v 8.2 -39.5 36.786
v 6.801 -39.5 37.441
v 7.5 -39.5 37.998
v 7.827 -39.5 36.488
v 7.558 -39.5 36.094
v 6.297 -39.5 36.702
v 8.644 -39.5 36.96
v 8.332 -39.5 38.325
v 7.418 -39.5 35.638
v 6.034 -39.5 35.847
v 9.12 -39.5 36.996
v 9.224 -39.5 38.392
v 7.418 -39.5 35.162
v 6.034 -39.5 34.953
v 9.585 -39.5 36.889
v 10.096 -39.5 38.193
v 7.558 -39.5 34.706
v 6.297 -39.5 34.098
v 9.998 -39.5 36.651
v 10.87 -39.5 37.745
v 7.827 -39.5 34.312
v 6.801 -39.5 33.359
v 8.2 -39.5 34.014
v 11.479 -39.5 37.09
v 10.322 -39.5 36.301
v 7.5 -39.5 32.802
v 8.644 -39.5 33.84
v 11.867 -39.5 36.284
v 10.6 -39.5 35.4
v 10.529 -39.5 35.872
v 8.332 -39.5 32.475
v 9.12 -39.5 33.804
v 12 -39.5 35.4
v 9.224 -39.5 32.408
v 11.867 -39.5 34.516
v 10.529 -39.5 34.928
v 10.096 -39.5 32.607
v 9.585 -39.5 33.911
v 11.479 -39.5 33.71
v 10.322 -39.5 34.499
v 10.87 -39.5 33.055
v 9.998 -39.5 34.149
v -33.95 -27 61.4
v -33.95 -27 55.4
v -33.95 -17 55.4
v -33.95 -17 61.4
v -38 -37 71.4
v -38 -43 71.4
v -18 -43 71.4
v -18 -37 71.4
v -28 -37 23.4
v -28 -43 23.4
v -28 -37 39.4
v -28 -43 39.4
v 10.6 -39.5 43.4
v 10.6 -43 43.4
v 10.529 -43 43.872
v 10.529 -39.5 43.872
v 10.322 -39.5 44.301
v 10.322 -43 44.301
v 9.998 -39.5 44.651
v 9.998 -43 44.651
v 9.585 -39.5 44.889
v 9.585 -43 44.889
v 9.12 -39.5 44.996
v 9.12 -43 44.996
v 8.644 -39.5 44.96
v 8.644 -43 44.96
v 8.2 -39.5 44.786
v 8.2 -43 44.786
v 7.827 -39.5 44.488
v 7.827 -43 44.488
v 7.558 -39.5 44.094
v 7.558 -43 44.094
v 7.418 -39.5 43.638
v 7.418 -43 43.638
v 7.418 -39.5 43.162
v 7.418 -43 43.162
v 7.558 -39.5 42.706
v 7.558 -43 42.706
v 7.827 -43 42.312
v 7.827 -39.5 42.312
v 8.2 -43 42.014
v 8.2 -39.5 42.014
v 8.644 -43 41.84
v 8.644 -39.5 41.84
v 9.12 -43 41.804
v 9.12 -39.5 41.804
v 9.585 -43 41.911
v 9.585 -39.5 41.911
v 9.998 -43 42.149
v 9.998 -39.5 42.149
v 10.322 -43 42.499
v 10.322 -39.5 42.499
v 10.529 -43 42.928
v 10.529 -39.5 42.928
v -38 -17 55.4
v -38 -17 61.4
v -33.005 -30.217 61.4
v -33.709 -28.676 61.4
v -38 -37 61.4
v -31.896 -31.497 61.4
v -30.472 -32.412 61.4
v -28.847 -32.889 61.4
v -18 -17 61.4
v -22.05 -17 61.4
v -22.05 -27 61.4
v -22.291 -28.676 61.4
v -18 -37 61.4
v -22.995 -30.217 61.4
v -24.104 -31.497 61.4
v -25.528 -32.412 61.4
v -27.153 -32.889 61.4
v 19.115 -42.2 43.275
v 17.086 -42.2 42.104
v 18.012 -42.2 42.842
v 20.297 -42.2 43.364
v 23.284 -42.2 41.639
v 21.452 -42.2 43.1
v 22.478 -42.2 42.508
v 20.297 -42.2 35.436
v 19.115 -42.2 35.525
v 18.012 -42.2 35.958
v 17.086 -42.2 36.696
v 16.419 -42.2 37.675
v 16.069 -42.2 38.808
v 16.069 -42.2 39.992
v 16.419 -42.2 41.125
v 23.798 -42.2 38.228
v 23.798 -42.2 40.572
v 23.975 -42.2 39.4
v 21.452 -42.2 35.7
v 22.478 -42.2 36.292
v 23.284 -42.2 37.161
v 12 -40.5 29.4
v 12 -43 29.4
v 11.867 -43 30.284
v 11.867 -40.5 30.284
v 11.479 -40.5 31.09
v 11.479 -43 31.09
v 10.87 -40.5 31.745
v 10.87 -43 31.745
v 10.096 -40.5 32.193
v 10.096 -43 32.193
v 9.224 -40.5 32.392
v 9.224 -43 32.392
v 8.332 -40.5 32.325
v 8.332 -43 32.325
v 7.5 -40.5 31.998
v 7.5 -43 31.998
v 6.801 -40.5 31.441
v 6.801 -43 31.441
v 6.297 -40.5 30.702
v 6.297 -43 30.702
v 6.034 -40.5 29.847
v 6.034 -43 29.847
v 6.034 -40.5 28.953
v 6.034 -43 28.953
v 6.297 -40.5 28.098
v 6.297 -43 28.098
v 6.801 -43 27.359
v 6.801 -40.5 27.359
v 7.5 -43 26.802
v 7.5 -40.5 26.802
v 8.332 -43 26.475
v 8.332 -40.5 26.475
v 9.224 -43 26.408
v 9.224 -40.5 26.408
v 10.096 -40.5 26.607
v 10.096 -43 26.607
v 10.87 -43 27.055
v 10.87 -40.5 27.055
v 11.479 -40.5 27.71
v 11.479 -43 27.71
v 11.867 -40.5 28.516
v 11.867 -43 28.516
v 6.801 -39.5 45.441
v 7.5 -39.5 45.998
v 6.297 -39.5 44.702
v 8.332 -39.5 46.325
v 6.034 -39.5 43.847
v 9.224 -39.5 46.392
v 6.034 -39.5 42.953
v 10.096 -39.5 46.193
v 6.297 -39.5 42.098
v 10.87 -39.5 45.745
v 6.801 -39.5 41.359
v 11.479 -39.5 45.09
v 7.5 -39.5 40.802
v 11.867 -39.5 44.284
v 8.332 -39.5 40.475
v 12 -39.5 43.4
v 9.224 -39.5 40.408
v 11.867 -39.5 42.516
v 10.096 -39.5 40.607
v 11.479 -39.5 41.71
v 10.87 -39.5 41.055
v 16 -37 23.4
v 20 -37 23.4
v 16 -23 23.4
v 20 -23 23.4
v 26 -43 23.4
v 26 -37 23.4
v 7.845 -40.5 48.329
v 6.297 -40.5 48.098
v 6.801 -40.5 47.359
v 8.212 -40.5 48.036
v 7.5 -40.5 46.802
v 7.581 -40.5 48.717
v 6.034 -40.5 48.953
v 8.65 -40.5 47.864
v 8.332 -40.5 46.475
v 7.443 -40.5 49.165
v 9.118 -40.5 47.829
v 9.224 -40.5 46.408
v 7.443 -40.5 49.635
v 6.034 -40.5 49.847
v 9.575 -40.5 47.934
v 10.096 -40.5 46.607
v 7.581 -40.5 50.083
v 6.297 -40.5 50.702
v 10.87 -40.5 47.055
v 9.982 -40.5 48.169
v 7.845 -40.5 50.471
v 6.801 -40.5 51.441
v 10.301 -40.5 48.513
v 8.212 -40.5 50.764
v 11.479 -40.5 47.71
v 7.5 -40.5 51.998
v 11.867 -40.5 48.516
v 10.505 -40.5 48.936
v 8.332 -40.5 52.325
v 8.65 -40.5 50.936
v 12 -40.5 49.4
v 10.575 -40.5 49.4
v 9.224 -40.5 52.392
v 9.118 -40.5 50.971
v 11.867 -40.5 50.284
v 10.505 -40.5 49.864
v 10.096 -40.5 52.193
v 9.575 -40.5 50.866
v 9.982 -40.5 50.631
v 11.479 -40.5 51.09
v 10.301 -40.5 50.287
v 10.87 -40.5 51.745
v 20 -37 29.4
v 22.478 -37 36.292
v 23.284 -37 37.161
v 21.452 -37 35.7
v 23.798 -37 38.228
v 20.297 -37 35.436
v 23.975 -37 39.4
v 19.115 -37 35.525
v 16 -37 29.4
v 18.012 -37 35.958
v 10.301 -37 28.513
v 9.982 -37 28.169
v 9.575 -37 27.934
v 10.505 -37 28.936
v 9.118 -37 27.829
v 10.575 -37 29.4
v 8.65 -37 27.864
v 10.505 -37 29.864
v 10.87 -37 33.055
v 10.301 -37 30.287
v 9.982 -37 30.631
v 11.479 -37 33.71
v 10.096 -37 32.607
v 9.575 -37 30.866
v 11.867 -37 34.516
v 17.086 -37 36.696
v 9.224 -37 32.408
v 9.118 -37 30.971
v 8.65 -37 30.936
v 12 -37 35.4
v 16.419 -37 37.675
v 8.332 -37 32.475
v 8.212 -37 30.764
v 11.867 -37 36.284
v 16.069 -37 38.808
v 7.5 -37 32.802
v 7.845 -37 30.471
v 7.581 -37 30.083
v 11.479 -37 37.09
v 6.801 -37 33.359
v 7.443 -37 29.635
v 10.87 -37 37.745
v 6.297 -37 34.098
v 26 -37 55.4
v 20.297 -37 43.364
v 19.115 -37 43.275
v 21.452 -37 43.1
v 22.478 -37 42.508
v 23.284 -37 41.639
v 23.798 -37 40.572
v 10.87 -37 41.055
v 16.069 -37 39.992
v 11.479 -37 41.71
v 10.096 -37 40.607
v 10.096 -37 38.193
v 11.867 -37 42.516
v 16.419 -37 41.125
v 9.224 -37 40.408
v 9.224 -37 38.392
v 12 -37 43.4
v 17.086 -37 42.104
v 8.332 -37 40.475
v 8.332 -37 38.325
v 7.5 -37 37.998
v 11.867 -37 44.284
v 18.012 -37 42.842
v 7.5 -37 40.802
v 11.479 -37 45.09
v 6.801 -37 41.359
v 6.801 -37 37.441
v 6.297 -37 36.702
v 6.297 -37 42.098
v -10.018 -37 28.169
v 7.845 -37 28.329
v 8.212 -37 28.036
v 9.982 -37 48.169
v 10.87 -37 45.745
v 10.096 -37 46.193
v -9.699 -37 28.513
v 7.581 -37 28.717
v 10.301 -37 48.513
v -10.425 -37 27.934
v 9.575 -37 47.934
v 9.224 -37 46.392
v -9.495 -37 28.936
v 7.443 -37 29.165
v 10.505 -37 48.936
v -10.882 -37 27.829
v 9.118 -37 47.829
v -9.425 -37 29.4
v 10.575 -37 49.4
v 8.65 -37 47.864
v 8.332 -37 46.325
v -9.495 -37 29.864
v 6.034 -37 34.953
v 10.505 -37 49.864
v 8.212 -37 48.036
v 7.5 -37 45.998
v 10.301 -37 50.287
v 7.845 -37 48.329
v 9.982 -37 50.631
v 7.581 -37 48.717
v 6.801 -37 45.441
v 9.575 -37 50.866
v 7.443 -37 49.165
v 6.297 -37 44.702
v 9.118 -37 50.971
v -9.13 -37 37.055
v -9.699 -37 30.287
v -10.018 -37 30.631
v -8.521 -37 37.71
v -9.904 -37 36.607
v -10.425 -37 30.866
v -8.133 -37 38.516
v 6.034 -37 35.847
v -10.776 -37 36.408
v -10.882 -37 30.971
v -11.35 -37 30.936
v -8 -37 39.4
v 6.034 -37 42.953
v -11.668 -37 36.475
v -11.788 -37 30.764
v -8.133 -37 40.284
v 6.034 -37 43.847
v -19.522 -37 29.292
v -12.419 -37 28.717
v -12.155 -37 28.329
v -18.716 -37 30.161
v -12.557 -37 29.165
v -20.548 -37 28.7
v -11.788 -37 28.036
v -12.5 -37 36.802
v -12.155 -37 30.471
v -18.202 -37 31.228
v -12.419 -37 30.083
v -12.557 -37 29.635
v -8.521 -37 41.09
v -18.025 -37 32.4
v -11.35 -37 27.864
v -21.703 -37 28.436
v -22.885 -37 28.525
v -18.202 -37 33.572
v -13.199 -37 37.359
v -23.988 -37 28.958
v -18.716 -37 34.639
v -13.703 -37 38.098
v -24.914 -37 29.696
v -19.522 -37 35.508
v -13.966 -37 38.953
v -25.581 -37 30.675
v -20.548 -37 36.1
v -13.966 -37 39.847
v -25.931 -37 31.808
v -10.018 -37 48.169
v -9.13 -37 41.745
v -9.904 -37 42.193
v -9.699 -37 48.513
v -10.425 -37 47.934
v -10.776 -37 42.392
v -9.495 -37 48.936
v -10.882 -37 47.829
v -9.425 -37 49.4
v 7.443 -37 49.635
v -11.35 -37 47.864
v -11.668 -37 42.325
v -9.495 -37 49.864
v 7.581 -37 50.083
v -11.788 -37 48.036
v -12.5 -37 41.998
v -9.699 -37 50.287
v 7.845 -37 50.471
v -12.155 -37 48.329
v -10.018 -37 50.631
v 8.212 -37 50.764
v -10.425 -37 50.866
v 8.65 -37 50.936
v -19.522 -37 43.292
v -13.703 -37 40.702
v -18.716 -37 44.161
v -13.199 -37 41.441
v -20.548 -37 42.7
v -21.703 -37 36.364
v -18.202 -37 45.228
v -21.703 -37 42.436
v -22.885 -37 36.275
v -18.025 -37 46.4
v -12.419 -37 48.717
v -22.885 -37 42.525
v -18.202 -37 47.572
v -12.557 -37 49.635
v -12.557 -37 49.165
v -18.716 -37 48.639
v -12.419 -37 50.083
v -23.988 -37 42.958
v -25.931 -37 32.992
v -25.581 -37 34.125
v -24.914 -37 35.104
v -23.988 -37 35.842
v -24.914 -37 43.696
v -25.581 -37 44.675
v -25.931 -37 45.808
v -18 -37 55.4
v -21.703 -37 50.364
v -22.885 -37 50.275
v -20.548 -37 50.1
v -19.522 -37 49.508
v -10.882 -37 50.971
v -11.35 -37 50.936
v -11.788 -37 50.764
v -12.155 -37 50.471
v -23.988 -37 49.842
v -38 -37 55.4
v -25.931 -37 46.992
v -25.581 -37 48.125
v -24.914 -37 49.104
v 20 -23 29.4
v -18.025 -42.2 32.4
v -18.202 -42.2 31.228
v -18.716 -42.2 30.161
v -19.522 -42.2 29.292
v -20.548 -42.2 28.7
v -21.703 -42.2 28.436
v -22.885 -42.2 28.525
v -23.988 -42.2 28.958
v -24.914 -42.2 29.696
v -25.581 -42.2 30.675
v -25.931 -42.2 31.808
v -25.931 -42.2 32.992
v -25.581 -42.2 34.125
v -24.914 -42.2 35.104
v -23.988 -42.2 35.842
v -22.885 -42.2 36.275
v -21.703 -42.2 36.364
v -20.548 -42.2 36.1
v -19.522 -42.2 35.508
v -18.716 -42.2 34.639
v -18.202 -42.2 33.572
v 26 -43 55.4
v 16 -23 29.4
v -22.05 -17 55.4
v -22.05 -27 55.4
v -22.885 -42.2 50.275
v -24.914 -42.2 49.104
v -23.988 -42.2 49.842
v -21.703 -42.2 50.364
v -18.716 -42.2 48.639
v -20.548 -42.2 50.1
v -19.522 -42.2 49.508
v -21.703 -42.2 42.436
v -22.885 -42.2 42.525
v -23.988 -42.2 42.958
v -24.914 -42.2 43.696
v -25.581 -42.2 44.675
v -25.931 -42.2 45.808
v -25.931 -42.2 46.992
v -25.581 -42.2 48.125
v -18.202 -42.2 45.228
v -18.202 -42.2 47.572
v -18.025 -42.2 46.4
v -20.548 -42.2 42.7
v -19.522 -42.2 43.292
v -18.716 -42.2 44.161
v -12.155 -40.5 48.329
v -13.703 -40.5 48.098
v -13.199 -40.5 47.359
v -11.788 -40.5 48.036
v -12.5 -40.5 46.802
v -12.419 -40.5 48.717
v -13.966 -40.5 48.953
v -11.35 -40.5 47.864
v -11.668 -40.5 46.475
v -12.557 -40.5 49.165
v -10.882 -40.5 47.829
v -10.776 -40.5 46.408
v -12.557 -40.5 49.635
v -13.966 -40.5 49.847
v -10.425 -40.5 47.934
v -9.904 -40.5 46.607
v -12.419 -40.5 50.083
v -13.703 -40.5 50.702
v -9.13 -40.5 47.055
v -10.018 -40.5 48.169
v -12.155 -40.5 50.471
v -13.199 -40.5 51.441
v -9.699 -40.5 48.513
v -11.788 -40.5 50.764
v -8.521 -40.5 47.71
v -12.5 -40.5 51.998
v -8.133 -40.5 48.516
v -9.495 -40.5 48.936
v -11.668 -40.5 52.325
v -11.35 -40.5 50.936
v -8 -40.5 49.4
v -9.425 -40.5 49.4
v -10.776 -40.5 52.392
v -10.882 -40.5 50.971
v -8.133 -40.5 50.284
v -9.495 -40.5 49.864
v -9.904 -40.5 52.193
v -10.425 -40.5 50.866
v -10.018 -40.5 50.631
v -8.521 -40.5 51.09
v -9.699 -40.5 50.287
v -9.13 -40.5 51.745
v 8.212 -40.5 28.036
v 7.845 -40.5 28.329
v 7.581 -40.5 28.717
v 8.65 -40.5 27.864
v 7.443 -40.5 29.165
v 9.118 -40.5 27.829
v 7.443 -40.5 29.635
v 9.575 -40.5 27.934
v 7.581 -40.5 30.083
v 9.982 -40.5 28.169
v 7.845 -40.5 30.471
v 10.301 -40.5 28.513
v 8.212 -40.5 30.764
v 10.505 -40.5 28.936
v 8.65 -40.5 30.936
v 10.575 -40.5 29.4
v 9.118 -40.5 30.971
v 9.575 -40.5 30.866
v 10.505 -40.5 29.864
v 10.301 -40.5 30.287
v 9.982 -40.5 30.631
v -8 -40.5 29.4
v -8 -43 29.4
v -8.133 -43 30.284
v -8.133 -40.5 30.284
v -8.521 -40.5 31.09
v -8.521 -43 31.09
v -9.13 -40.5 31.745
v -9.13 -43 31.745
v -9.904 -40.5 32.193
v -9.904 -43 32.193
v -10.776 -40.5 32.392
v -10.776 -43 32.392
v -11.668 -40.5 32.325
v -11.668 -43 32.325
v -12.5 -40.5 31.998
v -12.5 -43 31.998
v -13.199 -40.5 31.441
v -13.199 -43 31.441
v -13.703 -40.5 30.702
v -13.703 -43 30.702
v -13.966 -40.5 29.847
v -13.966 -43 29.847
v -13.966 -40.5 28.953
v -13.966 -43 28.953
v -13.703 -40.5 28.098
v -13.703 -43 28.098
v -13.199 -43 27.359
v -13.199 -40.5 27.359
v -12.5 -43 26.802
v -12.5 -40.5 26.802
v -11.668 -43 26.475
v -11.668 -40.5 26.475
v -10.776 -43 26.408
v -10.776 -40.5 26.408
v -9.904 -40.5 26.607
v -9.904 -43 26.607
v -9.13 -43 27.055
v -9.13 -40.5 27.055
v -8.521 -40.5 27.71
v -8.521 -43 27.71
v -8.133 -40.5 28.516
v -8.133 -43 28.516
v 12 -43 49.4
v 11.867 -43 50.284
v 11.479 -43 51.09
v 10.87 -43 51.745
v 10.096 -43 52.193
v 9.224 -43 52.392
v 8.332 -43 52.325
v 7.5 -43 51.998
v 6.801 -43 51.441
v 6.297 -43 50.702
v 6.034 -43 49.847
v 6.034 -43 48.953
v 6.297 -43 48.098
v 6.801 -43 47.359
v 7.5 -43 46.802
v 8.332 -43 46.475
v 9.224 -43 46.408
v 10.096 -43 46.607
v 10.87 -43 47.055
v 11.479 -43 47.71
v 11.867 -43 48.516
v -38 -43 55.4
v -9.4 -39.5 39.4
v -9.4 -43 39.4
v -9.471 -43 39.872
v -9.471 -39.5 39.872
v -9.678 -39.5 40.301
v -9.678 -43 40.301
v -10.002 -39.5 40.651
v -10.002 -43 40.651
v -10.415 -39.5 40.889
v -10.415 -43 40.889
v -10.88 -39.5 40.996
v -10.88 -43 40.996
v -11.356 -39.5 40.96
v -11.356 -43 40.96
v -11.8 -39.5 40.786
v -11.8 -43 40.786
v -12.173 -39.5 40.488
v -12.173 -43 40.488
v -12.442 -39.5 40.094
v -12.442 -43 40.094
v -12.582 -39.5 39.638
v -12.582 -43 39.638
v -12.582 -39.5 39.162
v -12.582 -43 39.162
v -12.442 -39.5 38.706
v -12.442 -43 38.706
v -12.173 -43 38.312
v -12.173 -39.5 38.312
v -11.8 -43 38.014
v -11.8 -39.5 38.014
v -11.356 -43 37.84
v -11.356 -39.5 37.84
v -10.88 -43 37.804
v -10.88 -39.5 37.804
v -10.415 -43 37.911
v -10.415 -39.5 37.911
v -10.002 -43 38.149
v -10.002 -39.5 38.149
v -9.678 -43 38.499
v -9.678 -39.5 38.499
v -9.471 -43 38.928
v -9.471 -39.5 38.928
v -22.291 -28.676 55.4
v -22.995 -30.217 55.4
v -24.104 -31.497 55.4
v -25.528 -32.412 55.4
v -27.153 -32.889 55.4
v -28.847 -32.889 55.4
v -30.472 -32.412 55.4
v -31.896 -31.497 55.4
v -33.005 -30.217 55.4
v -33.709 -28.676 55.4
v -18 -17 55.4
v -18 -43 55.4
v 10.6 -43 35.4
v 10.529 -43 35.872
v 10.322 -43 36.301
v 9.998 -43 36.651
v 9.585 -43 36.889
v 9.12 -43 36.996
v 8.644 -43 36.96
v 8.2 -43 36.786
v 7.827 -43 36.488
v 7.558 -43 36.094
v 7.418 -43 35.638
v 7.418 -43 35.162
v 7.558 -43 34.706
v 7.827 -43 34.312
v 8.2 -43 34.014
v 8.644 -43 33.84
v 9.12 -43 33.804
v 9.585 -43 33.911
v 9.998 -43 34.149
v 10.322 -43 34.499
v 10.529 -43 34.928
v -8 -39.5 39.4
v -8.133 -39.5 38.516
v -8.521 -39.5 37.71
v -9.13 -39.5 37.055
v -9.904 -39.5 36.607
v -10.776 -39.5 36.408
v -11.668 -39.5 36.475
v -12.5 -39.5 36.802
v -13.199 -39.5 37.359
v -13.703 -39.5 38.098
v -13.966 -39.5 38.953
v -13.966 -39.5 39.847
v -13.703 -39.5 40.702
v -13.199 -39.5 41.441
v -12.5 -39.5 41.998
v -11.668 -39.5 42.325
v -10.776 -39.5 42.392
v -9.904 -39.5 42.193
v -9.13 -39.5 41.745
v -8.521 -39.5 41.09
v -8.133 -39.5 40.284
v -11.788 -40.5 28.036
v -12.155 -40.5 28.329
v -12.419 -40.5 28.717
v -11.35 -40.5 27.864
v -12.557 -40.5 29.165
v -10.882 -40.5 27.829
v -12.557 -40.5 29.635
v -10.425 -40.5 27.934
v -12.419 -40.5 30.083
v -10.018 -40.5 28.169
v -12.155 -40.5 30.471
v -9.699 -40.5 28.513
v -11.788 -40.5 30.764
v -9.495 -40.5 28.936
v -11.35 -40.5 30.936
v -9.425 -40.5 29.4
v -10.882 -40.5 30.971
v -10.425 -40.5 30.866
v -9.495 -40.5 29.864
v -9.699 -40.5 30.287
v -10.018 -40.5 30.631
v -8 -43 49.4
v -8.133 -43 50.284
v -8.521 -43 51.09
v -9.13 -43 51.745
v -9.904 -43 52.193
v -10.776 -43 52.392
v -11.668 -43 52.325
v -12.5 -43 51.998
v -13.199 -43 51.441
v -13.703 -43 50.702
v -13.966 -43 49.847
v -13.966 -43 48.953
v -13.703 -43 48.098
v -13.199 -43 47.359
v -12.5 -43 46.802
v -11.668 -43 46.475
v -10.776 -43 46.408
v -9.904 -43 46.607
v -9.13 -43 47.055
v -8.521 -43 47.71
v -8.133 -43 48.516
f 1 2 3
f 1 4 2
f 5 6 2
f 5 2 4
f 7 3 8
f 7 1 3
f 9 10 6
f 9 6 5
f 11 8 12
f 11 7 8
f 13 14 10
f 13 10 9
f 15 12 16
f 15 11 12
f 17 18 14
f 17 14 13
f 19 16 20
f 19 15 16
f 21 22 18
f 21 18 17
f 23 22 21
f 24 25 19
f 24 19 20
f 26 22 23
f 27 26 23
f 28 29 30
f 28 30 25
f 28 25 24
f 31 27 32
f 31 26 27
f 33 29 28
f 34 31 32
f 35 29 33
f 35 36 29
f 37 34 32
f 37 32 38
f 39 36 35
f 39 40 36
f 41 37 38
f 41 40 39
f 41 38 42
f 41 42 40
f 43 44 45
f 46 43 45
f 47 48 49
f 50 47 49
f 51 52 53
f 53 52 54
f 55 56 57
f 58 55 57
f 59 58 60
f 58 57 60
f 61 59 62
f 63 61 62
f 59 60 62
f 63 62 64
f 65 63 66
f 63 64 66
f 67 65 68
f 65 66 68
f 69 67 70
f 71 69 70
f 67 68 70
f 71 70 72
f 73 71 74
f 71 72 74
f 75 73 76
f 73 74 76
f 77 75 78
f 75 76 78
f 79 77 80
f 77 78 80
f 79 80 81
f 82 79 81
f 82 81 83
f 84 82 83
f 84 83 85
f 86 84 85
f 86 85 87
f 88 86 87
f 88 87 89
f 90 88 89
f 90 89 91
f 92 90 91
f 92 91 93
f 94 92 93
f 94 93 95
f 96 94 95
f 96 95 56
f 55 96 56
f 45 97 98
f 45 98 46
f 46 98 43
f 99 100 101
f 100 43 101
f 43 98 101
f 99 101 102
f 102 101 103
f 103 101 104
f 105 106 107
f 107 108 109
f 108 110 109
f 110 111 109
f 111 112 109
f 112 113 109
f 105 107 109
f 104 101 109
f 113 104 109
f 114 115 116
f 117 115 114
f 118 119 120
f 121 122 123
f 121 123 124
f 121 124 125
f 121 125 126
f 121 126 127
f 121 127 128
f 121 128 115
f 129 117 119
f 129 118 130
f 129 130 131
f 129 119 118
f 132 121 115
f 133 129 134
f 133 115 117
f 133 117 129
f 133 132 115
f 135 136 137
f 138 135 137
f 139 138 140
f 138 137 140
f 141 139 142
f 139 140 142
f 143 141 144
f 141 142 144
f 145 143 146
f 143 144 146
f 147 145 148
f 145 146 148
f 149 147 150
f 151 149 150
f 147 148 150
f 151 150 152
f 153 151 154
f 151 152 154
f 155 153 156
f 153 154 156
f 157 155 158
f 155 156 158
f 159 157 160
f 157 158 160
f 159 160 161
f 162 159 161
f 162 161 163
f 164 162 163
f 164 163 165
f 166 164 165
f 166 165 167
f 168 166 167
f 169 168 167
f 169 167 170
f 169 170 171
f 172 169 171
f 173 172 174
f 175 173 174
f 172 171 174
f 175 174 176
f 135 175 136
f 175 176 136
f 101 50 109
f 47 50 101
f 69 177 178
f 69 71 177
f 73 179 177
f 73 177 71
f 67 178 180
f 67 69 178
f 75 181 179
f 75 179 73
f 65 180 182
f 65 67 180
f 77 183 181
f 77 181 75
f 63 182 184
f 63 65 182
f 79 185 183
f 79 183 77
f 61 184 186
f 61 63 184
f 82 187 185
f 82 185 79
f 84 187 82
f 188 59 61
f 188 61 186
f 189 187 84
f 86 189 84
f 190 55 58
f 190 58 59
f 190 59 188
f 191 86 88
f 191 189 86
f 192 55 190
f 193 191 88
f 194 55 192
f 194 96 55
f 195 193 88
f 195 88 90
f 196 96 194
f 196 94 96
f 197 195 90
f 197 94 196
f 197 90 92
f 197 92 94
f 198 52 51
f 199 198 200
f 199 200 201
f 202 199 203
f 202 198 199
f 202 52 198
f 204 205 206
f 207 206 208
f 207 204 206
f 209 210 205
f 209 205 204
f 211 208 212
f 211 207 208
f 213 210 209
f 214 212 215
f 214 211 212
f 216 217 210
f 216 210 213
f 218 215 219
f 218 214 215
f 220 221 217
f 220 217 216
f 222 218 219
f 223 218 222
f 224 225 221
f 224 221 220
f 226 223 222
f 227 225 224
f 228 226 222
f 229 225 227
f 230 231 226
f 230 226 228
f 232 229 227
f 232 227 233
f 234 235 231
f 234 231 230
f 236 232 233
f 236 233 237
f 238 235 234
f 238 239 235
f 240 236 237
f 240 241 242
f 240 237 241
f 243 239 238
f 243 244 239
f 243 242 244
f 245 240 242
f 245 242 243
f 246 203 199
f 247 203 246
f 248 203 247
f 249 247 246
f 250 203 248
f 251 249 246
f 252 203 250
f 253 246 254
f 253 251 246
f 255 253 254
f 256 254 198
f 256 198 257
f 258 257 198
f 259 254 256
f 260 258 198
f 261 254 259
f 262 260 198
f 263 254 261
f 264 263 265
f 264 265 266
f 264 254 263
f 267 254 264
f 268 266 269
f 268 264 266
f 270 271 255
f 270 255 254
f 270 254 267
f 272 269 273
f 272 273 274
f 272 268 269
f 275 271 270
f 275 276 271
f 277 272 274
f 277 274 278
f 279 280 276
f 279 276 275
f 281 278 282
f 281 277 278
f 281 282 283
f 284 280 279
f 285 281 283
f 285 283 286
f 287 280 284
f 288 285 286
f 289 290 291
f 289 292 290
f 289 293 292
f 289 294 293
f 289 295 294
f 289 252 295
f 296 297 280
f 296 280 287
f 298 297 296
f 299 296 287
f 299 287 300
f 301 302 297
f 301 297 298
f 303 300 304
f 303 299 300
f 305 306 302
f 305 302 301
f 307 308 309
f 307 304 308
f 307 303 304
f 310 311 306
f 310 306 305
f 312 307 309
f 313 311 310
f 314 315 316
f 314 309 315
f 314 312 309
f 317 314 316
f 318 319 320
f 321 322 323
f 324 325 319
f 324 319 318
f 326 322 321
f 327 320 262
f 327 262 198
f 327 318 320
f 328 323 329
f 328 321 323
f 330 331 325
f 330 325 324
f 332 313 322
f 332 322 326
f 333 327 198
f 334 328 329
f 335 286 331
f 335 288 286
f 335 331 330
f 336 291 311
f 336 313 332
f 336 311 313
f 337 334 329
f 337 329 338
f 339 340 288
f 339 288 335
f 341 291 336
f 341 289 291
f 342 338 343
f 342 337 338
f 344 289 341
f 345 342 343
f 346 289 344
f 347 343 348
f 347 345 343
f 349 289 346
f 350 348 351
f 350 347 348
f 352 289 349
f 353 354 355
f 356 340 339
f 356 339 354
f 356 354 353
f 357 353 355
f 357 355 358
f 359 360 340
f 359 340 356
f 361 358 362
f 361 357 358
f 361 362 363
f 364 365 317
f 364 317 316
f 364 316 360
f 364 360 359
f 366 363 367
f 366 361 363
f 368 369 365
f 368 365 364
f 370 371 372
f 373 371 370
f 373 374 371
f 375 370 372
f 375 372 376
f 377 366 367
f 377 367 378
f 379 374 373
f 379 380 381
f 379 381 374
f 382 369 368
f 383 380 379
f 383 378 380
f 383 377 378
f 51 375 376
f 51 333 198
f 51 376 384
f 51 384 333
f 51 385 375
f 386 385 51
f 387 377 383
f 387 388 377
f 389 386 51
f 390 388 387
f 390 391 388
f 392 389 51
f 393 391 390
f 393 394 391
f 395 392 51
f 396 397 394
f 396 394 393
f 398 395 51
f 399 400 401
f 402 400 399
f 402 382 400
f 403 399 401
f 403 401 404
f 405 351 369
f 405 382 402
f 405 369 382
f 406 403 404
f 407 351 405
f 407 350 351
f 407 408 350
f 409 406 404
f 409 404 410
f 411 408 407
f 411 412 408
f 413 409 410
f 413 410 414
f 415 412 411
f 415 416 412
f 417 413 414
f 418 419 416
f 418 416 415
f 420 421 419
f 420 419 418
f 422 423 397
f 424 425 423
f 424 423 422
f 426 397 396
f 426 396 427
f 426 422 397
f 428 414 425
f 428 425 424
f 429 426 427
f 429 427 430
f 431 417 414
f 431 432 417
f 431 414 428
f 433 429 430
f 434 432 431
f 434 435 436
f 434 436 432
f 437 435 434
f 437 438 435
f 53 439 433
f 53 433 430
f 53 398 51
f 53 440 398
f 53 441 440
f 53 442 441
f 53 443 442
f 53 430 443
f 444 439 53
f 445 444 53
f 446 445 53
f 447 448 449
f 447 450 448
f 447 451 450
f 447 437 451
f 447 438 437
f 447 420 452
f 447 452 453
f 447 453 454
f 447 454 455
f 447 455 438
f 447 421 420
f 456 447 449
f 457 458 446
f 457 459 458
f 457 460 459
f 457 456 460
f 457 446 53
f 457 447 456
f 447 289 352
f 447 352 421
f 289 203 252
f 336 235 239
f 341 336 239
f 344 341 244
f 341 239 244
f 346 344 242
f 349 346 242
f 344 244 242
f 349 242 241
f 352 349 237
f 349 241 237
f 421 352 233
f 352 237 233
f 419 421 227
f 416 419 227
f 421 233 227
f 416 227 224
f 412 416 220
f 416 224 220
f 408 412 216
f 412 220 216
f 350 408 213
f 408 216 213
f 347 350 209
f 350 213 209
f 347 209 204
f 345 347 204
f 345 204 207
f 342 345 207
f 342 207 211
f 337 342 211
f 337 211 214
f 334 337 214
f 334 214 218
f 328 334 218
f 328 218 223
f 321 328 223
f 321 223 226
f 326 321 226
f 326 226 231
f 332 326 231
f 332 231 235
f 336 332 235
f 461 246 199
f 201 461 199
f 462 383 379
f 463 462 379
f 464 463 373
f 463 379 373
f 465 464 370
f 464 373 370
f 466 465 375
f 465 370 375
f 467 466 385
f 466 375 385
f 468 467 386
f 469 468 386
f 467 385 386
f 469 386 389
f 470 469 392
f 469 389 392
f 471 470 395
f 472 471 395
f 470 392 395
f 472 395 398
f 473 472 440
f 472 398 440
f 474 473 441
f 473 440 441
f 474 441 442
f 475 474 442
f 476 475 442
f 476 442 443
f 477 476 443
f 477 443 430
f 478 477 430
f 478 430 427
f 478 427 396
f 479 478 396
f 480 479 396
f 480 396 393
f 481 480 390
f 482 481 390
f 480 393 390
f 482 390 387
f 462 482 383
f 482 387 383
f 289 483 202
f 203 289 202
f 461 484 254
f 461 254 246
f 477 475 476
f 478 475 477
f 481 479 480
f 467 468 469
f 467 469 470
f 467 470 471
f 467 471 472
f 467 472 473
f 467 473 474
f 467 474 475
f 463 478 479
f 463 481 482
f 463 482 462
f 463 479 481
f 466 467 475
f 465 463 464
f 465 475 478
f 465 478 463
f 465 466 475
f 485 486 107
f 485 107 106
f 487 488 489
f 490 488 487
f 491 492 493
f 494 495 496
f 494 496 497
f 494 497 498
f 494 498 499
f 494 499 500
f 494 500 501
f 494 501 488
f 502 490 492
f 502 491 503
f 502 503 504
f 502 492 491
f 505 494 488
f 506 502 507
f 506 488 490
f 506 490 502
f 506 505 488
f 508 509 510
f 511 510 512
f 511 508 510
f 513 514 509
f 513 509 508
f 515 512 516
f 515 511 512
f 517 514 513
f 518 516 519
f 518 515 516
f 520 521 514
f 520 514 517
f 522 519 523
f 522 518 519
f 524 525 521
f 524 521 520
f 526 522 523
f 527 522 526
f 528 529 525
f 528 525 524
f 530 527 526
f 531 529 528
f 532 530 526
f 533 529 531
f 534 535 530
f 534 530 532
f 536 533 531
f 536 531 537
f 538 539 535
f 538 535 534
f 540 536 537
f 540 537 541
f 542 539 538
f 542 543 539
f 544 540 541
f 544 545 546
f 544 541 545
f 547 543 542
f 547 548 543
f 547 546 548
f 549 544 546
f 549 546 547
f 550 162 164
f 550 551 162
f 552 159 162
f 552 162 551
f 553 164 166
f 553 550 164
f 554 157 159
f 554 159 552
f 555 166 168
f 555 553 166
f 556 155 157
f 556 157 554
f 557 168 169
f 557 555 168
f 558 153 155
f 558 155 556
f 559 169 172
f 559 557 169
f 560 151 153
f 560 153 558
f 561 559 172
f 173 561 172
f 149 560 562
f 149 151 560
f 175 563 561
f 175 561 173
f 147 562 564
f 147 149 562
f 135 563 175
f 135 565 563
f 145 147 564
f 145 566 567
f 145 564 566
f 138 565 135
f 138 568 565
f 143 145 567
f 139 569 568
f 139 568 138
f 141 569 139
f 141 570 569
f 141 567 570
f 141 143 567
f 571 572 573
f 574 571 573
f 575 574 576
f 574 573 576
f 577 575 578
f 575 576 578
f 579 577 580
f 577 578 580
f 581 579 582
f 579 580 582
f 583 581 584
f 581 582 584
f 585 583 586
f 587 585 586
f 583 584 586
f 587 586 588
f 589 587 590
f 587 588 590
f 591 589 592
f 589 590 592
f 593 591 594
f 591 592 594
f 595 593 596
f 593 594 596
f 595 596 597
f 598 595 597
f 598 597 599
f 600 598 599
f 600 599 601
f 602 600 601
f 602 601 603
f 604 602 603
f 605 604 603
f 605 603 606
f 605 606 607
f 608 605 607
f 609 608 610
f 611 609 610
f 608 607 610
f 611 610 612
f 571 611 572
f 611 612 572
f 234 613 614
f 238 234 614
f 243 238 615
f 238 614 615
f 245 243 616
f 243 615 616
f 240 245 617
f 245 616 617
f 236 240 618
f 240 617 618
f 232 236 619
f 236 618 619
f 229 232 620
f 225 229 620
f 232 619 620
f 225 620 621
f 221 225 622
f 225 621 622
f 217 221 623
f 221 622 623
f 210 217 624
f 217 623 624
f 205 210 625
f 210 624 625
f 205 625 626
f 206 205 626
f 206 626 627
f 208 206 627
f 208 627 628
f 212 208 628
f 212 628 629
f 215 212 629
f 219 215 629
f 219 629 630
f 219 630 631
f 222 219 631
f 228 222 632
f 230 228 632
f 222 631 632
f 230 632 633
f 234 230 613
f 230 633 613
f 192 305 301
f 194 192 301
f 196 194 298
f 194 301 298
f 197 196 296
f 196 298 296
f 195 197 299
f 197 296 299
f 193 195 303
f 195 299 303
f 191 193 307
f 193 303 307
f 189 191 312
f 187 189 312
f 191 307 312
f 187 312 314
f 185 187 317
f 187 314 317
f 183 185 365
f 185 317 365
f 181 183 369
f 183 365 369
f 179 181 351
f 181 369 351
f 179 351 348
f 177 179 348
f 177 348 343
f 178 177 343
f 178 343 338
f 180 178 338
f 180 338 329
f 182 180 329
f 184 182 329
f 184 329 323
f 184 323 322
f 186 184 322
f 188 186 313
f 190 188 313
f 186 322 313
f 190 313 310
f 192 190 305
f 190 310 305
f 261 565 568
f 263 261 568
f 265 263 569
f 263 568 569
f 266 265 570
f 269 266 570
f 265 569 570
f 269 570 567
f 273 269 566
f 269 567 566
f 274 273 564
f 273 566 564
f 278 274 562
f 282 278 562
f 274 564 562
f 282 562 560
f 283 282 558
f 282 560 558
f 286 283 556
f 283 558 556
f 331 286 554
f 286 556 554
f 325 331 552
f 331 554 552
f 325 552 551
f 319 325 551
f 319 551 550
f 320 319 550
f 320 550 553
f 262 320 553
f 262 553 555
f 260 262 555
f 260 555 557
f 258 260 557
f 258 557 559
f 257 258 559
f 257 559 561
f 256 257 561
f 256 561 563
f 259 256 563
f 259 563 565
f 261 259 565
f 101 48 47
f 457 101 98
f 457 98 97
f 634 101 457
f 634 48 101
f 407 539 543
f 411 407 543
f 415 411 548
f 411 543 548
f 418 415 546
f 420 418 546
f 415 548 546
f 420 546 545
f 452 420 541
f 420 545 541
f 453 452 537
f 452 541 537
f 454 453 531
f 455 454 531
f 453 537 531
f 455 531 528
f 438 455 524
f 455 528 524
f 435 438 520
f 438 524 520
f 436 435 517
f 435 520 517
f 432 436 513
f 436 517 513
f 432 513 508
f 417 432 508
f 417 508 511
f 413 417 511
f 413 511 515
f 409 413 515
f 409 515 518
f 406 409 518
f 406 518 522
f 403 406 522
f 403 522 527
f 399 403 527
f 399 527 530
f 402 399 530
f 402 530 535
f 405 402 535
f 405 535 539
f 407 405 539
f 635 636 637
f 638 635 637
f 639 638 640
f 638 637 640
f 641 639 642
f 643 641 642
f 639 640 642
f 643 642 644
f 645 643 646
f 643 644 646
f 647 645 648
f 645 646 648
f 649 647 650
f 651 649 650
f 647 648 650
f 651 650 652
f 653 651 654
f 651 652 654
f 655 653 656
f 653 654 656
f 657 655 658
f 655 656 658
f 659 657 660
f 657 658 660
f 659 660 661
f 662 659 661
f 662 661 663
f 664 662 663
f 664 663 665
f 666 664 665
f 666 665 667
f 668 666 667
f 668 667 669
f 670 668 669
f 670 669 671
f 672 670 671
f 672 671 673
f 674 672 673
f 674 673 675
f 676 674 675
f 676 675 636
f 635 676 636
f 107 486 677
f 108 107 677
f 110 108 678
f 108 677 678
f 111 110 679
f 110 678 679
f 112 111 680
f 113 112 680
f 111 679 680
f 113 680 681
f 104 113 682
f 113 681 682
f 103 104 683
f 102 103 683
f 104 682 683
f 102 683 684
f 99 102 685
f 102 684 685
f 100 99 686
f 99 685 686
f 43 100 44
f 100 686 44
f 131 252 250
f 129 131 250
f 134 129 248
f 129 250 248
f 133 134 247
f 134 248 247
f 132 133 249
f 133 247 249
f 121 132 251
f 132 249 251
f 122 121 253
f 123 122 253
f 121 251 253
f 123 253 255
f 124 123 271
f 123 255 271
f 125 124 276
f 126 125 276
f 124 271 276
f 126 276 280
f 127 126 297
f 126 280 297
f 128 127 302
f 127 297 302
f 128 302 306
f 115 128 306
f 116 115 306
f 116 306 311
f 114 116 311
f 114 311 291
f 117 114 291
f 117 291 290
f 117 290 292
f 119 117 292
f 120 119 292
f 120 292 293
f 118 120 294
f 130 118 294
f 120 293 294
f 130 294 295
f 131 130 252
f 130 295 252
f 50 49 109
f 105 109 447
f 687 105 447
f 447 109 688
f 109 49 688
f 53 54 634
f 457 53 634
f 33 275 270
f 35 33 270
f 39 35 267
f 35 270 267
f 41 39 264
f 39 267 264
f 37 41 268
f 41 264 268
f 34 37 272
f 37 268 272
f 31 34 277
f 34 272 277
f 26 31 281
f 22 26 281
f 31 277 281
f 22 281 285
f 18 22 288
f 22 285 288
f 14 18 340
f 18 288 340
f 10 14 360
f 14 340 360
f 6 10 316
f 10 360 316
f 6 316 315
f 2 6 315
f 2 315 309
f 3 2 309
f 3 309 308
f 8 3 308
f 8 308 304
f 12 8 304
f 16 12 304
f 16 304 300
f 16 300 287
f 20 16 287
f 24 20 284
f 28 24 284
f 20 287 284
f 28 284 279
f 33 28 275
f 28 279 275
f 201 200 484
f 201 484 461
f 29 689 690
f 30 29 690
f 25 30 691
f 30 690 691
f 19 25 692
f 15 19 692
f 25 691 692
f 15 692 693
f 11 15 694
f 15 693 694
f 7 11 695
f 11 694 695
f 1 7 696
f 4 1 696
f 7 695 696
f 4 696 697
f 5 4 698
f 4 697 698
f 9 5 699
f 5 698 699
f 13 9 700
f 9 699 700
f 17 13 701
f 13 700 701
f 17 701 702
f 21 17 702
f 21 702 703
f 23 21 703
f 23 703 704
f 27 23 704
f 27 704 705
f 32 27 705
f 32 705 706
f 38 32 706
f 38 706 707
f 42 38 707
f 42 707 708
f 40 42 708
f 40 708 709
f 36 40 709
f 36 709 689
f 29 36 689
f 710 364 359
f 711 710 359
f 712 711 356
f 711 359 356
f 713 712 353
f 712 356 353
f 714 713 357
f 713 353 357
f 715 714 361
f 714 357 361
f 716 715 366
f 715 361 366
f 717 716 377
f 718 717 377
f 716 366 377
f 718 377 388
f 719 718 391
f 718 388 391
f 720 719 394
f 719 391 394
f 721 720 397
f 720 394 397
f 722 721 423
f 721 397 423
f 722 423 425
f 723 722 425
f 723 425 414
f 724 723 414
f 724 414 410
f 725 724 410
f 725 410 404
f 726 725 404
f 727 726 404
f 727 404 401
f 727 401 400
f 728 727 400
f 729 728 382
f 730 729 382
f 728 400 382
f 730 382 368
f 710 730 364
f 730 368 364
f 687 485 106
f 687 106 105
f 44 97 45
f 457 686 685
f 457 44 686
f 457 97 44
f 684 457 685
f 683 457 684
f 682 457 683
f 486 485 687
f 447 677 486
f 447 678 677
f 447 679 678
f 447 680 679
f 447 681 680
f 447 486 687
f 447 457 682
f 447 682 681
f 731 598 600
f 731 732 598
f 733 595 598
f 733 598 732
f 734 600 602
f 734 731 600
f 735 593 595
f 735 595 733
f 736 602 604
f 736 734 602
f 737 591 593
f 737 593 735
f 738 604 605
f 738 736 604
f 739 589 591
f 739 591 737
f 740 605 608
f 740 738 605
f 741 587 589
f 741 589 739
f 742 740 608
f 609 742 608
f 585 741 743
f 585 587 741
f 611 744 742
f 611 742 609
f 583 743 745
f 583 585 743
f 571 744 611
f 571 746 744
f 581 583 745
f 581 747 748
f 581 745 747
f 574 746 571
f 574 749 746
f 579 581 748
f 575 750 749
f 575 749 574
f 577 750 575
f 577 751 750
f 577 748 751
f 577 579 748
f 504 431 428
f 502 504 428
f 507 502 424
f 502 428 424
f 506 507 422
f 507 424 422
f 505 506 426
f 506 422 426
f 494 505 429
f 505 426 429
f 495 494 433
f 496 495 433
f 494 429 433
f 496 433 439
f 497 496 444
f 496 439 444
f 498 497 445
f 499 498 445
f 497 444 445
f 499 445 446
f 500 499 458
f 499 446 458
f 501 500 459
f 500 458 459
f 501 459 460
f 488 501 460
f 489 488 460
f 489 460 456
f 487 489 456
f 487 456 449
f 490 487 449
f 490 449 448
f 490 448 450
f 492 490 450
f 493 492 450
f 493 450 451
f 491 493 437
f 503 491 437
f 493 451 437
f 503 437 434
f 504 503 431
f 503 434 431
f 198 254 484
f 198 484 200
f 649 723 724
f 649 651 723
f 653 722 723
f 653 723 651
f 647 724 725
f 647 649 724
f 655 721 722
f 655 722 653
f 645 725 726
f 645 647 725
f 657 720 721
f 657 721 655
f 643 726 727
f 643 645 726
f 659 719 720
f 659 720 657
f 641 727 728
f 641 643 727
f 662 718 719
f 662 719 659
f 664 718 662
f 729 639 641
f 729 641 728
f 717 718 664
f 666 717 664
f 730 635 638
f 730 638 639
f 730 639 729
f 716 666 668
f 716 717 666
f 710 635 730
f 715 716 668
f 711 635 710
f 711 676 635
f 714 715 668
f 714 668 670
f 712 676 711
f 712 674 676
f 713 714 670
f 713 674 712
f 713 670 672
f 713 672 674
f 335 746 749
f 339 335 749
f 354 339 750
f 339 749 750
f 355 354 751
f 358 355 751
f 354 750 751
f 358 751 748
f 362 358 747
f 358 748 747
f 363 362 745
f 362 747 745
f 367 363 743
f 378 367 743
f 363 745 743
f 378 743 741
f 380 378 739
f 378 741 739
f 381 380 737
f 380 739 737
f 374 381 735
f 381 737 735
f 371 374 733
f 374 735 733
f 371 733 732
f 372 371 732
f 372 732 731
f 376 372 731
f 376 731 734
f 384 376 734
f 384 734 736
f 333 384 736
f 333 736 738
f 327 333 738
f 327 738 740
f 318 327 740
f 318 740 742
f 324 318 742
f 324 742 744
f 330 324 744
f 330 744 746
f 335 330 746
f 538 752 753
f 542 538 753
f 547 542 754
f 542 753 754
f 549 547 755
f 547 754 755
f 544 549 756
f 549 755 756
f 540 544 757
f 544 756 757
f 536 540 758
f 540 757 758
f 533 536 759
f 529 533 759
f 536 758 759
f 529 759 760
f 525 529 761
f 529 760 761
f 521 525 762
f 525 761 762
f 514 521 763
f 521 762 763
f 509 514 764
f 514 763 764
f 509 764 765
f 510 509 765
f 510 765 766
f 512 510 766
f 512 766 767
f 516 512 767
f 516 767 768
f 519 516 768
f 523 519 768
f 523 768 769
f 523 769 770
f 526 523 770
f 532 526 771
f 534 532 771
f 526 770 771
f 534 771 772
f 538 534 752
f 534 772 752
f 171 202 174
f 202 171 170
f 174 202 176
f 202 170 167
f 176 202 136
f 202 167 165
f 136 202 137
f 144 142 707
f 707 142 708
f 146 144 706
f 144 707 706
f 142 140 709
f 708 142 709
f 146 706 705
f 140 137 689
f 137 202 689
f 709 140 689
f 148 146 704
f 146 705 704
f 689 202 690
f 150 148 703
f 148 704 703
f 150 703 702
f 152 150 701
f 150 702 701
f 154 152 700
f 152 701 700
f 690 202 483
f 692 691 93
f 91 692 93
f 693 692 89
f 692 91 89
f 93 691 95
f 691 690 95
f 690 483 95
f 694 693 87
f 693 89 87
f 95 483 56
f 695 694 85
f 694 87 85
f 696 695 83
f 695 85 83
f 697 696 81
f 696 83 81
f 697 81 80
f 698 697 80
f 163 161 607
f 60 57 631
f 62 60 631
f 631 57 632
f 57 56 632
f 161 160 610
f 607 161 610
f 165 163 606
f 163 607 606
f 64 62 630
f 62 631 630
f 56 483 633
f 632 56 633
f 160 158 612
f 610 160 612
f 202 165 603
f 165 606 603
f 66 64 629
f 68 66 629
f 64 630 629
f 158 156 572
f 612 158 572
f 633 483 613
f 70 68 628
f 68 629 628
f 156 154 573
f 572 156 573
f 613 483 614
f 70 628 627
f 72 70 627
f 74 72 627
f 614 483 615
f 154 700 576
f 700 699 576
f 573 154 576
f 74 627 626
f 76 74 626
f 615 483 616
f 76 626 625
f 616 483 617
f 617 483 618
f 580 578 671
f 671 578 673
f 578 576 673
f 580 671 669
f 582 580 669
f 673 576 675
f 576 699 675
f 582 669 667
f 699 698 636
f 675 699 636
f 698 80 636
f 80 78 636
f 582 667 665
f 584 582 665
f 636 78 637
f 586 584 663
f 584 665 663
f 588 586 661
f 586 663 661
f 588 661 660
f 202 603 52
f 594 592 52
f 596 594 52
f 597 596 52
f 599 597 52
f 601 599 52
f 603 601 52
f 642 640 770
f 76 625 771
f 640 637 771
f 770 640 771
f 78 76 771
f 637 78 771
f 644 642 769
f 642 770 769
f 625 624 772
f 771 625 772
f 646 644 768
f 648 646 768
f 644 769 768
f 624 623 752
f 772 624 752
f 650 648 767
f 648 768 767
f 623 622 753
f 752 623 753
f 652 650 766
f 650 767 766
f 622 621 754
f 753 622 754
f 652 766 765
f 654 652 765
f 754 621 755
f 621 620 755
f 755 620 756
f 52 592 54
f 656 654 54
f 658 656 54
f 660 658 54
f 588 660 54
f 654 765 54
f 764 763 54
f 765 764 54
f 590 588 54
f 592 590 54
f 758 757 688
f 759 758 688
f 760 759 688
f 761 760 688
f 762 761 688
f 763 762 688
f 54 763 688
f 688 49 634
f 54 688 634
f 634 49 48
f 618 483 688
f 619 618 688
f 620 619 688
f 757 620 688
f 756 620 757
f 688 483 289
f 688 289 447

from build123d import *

# Parameters (mm, degrees)
SKETCH033_W     = 30
SKETCH033_H     = 32
PAD023_DEPTH    = 6
PAD024_DEPTH    = 6
SKETCH035_R     = 1.575
POCKET011_DEPTH = 6
SKETCH045_W     = 20
SKETCH045_H     = 6
PAD030_DEPTH    = 20
POCKET016_DEPTH = 12
SKETCH047_R     = 1.6
POCKET017_DEPTH = 6
SKETCH048_R     = 3
POCKET018_DEPTH = 2.5
SKETCH049_R     = 3
POCKET019_DEPTH = 2.5
SKETCH084_W     = 4
SKETCH084_H     = 6
PAD049_DEPTH    = 14
SKETCH085_R     = 3.975
POCKET036_DEPTH = 5.2


with BuildPart() as part:
    # Sketch033 → Pad023 (new body)
    with BuildSketch(Plane.XZ):
        Rectangle(SKETCH033_W, SKETCH033_H)
    extrude(amount=PAD023_DEPTH)

    # Sketch034 (on Face6 of Pad023) → Pad024 (join)
    with BuildSketch(Plane.XZ.offset(6)):
        Polygon((-15, 16), (15, 16), (27, 16), (27, -16), (15, -16), (-15, -16), (-27, -16), (-27, 0), (-37, 16), (-37, 32), (-17, 32), (-17, 16), align=None)
    extrude(amount=-PAD024_DEPTH)

    # Sketch035 (on Face9 of Pad024) → Pocket011 (cut)
    with BuildSketch(Plane.XZ.offset(6)):
        with Locations((-10, 10)):
            Circle(SKETCH035_R)
        with Locations((10, 10)):
            Circle(SKETCH035_R)
        with Locations((10, -10)):
            Circle(SKETCH035_R)
        with Locations((-10, -10)):
            Circle(SKETCH035_R)
    extrude(amount=-POCKET011_DEPTH, mode=Mode.SUBTRACT)

    # Sketch045 → Pad030 (join)
    with BuildSketch(Plane(origin=(0, 0, 0), x_dir=(1, 0, 0), z_dir=(0, 1, 0))):
        with Locations((-27, -19)):
            Rectangle(SKETCH045_W, SKETCH045_H)
    extrude(amount=PAD030_DEPTH)

    # Sketch046 (on Face13 of Pad030) → Pocket016 (cut)
    with BuildSketch(Plane(origin=(0, 0, 16), x_dir=(1, 0, 0), z_dir=(0, 0, -1))):
        with BuildLine():
            ThreePointArc((-21.05, -10), (-27, -4.05), (-32.95, -10))
            Line((-32.95, -10), (-32.95, -25))
            ThreePointArc((-32.95, -25), (-27, -30.95), (-21.05, -25))
            Line((-21.05, -10), (-21.05, -25))
        make_face()
    extrude(amount=-POCKET016_DEPTH, mode=Mode.SUBTRACT)

    # Sketch047 (on Face4 of Pocket016) → Pocket017 (cut)
    with BuildSketch(Plane.XZ.offset(6)):
        with Locations((10, -4)):
            Circle(SKETCH047_R)
        with Locations((10, 4)):
            Circle(SKETCH047_R)
        with Locations((-10, 0)):
            Circle(SKETCH047_R)
    extrude(amount=-POCKET017_DEPTH, mode=Mode.SUBTRACT)

    # Sketch048 (on Face4 of Pocket017) → Pocket018 (cut)
    with BuildSketch(Plane.XZ.offset(6)):
        with Locations((-10, 10)):
            Circle(SKETCH048_R)
        with Locations((10, 10)):
            Circle(SKETCH048_R)
        with Locations((10, -10)):
            Circle(SKETCH048_R)
        with Locations((-10, -10)):
            Circle(SKETCH048_R)
    extrude(amount=-POCKET018_DEPTH, mode=Mode.SUBTRACT)

    # Sketch049 (on Face5 of Pocket018) → Pocket019 (cut)
    with BuildSketch(Plane(origin=(0, 0, 0), x_dir=(1, 0, 0), z_dir=(0, 1, 0))):
        with Locations((-10, 0)):
            Circle(SKETCH049_R)
        with Locations((10, 4)):
            Circle(SKETCH049_R)
        with Locations((10, -4)):
            Circle(SKETCH049_R)
    extrude(amount=-POCKET019_DEPTH, mode=Mode.SUBTRACT)

    # Sketch084 (on Face8 of Pad024) → Pad049 (join)
    with BuildSketch(Plane(origin=(0, 0, 0), x_dir=(1, 0, 0), z_dir=(0, 1, 0))):
        with Locations((19, 13)):
            Rectangle(SKETCH084_W, SKETCH084_H)
    extrude(amount=PAD049_DEPTH)

    # Sketch085 (on Face4 of Pad049) → Pocket036 (cut)
    with BuildSketch(Plane(origin=(0, 0, 0), x_dir=(1, 0, 0), z_dir=(0, 1, 0))):
        with Locations((21, 0)):
            Circle(SKETCH085_R)
        with Locations((-21, 7)):
            Circle(SKETCH085_R)
        with Locations((-21, -7)):
            Circle(SKETCH085_R)
    extrude(amount=-POCKET036_DEPTH, mode=Mode.SUBTRACT)


with BuildPart() as part_1:
    # Body005 placement: moved
    add(part.part.moved(Location((-1, -37, 39.4))))


solid = part_1.part
